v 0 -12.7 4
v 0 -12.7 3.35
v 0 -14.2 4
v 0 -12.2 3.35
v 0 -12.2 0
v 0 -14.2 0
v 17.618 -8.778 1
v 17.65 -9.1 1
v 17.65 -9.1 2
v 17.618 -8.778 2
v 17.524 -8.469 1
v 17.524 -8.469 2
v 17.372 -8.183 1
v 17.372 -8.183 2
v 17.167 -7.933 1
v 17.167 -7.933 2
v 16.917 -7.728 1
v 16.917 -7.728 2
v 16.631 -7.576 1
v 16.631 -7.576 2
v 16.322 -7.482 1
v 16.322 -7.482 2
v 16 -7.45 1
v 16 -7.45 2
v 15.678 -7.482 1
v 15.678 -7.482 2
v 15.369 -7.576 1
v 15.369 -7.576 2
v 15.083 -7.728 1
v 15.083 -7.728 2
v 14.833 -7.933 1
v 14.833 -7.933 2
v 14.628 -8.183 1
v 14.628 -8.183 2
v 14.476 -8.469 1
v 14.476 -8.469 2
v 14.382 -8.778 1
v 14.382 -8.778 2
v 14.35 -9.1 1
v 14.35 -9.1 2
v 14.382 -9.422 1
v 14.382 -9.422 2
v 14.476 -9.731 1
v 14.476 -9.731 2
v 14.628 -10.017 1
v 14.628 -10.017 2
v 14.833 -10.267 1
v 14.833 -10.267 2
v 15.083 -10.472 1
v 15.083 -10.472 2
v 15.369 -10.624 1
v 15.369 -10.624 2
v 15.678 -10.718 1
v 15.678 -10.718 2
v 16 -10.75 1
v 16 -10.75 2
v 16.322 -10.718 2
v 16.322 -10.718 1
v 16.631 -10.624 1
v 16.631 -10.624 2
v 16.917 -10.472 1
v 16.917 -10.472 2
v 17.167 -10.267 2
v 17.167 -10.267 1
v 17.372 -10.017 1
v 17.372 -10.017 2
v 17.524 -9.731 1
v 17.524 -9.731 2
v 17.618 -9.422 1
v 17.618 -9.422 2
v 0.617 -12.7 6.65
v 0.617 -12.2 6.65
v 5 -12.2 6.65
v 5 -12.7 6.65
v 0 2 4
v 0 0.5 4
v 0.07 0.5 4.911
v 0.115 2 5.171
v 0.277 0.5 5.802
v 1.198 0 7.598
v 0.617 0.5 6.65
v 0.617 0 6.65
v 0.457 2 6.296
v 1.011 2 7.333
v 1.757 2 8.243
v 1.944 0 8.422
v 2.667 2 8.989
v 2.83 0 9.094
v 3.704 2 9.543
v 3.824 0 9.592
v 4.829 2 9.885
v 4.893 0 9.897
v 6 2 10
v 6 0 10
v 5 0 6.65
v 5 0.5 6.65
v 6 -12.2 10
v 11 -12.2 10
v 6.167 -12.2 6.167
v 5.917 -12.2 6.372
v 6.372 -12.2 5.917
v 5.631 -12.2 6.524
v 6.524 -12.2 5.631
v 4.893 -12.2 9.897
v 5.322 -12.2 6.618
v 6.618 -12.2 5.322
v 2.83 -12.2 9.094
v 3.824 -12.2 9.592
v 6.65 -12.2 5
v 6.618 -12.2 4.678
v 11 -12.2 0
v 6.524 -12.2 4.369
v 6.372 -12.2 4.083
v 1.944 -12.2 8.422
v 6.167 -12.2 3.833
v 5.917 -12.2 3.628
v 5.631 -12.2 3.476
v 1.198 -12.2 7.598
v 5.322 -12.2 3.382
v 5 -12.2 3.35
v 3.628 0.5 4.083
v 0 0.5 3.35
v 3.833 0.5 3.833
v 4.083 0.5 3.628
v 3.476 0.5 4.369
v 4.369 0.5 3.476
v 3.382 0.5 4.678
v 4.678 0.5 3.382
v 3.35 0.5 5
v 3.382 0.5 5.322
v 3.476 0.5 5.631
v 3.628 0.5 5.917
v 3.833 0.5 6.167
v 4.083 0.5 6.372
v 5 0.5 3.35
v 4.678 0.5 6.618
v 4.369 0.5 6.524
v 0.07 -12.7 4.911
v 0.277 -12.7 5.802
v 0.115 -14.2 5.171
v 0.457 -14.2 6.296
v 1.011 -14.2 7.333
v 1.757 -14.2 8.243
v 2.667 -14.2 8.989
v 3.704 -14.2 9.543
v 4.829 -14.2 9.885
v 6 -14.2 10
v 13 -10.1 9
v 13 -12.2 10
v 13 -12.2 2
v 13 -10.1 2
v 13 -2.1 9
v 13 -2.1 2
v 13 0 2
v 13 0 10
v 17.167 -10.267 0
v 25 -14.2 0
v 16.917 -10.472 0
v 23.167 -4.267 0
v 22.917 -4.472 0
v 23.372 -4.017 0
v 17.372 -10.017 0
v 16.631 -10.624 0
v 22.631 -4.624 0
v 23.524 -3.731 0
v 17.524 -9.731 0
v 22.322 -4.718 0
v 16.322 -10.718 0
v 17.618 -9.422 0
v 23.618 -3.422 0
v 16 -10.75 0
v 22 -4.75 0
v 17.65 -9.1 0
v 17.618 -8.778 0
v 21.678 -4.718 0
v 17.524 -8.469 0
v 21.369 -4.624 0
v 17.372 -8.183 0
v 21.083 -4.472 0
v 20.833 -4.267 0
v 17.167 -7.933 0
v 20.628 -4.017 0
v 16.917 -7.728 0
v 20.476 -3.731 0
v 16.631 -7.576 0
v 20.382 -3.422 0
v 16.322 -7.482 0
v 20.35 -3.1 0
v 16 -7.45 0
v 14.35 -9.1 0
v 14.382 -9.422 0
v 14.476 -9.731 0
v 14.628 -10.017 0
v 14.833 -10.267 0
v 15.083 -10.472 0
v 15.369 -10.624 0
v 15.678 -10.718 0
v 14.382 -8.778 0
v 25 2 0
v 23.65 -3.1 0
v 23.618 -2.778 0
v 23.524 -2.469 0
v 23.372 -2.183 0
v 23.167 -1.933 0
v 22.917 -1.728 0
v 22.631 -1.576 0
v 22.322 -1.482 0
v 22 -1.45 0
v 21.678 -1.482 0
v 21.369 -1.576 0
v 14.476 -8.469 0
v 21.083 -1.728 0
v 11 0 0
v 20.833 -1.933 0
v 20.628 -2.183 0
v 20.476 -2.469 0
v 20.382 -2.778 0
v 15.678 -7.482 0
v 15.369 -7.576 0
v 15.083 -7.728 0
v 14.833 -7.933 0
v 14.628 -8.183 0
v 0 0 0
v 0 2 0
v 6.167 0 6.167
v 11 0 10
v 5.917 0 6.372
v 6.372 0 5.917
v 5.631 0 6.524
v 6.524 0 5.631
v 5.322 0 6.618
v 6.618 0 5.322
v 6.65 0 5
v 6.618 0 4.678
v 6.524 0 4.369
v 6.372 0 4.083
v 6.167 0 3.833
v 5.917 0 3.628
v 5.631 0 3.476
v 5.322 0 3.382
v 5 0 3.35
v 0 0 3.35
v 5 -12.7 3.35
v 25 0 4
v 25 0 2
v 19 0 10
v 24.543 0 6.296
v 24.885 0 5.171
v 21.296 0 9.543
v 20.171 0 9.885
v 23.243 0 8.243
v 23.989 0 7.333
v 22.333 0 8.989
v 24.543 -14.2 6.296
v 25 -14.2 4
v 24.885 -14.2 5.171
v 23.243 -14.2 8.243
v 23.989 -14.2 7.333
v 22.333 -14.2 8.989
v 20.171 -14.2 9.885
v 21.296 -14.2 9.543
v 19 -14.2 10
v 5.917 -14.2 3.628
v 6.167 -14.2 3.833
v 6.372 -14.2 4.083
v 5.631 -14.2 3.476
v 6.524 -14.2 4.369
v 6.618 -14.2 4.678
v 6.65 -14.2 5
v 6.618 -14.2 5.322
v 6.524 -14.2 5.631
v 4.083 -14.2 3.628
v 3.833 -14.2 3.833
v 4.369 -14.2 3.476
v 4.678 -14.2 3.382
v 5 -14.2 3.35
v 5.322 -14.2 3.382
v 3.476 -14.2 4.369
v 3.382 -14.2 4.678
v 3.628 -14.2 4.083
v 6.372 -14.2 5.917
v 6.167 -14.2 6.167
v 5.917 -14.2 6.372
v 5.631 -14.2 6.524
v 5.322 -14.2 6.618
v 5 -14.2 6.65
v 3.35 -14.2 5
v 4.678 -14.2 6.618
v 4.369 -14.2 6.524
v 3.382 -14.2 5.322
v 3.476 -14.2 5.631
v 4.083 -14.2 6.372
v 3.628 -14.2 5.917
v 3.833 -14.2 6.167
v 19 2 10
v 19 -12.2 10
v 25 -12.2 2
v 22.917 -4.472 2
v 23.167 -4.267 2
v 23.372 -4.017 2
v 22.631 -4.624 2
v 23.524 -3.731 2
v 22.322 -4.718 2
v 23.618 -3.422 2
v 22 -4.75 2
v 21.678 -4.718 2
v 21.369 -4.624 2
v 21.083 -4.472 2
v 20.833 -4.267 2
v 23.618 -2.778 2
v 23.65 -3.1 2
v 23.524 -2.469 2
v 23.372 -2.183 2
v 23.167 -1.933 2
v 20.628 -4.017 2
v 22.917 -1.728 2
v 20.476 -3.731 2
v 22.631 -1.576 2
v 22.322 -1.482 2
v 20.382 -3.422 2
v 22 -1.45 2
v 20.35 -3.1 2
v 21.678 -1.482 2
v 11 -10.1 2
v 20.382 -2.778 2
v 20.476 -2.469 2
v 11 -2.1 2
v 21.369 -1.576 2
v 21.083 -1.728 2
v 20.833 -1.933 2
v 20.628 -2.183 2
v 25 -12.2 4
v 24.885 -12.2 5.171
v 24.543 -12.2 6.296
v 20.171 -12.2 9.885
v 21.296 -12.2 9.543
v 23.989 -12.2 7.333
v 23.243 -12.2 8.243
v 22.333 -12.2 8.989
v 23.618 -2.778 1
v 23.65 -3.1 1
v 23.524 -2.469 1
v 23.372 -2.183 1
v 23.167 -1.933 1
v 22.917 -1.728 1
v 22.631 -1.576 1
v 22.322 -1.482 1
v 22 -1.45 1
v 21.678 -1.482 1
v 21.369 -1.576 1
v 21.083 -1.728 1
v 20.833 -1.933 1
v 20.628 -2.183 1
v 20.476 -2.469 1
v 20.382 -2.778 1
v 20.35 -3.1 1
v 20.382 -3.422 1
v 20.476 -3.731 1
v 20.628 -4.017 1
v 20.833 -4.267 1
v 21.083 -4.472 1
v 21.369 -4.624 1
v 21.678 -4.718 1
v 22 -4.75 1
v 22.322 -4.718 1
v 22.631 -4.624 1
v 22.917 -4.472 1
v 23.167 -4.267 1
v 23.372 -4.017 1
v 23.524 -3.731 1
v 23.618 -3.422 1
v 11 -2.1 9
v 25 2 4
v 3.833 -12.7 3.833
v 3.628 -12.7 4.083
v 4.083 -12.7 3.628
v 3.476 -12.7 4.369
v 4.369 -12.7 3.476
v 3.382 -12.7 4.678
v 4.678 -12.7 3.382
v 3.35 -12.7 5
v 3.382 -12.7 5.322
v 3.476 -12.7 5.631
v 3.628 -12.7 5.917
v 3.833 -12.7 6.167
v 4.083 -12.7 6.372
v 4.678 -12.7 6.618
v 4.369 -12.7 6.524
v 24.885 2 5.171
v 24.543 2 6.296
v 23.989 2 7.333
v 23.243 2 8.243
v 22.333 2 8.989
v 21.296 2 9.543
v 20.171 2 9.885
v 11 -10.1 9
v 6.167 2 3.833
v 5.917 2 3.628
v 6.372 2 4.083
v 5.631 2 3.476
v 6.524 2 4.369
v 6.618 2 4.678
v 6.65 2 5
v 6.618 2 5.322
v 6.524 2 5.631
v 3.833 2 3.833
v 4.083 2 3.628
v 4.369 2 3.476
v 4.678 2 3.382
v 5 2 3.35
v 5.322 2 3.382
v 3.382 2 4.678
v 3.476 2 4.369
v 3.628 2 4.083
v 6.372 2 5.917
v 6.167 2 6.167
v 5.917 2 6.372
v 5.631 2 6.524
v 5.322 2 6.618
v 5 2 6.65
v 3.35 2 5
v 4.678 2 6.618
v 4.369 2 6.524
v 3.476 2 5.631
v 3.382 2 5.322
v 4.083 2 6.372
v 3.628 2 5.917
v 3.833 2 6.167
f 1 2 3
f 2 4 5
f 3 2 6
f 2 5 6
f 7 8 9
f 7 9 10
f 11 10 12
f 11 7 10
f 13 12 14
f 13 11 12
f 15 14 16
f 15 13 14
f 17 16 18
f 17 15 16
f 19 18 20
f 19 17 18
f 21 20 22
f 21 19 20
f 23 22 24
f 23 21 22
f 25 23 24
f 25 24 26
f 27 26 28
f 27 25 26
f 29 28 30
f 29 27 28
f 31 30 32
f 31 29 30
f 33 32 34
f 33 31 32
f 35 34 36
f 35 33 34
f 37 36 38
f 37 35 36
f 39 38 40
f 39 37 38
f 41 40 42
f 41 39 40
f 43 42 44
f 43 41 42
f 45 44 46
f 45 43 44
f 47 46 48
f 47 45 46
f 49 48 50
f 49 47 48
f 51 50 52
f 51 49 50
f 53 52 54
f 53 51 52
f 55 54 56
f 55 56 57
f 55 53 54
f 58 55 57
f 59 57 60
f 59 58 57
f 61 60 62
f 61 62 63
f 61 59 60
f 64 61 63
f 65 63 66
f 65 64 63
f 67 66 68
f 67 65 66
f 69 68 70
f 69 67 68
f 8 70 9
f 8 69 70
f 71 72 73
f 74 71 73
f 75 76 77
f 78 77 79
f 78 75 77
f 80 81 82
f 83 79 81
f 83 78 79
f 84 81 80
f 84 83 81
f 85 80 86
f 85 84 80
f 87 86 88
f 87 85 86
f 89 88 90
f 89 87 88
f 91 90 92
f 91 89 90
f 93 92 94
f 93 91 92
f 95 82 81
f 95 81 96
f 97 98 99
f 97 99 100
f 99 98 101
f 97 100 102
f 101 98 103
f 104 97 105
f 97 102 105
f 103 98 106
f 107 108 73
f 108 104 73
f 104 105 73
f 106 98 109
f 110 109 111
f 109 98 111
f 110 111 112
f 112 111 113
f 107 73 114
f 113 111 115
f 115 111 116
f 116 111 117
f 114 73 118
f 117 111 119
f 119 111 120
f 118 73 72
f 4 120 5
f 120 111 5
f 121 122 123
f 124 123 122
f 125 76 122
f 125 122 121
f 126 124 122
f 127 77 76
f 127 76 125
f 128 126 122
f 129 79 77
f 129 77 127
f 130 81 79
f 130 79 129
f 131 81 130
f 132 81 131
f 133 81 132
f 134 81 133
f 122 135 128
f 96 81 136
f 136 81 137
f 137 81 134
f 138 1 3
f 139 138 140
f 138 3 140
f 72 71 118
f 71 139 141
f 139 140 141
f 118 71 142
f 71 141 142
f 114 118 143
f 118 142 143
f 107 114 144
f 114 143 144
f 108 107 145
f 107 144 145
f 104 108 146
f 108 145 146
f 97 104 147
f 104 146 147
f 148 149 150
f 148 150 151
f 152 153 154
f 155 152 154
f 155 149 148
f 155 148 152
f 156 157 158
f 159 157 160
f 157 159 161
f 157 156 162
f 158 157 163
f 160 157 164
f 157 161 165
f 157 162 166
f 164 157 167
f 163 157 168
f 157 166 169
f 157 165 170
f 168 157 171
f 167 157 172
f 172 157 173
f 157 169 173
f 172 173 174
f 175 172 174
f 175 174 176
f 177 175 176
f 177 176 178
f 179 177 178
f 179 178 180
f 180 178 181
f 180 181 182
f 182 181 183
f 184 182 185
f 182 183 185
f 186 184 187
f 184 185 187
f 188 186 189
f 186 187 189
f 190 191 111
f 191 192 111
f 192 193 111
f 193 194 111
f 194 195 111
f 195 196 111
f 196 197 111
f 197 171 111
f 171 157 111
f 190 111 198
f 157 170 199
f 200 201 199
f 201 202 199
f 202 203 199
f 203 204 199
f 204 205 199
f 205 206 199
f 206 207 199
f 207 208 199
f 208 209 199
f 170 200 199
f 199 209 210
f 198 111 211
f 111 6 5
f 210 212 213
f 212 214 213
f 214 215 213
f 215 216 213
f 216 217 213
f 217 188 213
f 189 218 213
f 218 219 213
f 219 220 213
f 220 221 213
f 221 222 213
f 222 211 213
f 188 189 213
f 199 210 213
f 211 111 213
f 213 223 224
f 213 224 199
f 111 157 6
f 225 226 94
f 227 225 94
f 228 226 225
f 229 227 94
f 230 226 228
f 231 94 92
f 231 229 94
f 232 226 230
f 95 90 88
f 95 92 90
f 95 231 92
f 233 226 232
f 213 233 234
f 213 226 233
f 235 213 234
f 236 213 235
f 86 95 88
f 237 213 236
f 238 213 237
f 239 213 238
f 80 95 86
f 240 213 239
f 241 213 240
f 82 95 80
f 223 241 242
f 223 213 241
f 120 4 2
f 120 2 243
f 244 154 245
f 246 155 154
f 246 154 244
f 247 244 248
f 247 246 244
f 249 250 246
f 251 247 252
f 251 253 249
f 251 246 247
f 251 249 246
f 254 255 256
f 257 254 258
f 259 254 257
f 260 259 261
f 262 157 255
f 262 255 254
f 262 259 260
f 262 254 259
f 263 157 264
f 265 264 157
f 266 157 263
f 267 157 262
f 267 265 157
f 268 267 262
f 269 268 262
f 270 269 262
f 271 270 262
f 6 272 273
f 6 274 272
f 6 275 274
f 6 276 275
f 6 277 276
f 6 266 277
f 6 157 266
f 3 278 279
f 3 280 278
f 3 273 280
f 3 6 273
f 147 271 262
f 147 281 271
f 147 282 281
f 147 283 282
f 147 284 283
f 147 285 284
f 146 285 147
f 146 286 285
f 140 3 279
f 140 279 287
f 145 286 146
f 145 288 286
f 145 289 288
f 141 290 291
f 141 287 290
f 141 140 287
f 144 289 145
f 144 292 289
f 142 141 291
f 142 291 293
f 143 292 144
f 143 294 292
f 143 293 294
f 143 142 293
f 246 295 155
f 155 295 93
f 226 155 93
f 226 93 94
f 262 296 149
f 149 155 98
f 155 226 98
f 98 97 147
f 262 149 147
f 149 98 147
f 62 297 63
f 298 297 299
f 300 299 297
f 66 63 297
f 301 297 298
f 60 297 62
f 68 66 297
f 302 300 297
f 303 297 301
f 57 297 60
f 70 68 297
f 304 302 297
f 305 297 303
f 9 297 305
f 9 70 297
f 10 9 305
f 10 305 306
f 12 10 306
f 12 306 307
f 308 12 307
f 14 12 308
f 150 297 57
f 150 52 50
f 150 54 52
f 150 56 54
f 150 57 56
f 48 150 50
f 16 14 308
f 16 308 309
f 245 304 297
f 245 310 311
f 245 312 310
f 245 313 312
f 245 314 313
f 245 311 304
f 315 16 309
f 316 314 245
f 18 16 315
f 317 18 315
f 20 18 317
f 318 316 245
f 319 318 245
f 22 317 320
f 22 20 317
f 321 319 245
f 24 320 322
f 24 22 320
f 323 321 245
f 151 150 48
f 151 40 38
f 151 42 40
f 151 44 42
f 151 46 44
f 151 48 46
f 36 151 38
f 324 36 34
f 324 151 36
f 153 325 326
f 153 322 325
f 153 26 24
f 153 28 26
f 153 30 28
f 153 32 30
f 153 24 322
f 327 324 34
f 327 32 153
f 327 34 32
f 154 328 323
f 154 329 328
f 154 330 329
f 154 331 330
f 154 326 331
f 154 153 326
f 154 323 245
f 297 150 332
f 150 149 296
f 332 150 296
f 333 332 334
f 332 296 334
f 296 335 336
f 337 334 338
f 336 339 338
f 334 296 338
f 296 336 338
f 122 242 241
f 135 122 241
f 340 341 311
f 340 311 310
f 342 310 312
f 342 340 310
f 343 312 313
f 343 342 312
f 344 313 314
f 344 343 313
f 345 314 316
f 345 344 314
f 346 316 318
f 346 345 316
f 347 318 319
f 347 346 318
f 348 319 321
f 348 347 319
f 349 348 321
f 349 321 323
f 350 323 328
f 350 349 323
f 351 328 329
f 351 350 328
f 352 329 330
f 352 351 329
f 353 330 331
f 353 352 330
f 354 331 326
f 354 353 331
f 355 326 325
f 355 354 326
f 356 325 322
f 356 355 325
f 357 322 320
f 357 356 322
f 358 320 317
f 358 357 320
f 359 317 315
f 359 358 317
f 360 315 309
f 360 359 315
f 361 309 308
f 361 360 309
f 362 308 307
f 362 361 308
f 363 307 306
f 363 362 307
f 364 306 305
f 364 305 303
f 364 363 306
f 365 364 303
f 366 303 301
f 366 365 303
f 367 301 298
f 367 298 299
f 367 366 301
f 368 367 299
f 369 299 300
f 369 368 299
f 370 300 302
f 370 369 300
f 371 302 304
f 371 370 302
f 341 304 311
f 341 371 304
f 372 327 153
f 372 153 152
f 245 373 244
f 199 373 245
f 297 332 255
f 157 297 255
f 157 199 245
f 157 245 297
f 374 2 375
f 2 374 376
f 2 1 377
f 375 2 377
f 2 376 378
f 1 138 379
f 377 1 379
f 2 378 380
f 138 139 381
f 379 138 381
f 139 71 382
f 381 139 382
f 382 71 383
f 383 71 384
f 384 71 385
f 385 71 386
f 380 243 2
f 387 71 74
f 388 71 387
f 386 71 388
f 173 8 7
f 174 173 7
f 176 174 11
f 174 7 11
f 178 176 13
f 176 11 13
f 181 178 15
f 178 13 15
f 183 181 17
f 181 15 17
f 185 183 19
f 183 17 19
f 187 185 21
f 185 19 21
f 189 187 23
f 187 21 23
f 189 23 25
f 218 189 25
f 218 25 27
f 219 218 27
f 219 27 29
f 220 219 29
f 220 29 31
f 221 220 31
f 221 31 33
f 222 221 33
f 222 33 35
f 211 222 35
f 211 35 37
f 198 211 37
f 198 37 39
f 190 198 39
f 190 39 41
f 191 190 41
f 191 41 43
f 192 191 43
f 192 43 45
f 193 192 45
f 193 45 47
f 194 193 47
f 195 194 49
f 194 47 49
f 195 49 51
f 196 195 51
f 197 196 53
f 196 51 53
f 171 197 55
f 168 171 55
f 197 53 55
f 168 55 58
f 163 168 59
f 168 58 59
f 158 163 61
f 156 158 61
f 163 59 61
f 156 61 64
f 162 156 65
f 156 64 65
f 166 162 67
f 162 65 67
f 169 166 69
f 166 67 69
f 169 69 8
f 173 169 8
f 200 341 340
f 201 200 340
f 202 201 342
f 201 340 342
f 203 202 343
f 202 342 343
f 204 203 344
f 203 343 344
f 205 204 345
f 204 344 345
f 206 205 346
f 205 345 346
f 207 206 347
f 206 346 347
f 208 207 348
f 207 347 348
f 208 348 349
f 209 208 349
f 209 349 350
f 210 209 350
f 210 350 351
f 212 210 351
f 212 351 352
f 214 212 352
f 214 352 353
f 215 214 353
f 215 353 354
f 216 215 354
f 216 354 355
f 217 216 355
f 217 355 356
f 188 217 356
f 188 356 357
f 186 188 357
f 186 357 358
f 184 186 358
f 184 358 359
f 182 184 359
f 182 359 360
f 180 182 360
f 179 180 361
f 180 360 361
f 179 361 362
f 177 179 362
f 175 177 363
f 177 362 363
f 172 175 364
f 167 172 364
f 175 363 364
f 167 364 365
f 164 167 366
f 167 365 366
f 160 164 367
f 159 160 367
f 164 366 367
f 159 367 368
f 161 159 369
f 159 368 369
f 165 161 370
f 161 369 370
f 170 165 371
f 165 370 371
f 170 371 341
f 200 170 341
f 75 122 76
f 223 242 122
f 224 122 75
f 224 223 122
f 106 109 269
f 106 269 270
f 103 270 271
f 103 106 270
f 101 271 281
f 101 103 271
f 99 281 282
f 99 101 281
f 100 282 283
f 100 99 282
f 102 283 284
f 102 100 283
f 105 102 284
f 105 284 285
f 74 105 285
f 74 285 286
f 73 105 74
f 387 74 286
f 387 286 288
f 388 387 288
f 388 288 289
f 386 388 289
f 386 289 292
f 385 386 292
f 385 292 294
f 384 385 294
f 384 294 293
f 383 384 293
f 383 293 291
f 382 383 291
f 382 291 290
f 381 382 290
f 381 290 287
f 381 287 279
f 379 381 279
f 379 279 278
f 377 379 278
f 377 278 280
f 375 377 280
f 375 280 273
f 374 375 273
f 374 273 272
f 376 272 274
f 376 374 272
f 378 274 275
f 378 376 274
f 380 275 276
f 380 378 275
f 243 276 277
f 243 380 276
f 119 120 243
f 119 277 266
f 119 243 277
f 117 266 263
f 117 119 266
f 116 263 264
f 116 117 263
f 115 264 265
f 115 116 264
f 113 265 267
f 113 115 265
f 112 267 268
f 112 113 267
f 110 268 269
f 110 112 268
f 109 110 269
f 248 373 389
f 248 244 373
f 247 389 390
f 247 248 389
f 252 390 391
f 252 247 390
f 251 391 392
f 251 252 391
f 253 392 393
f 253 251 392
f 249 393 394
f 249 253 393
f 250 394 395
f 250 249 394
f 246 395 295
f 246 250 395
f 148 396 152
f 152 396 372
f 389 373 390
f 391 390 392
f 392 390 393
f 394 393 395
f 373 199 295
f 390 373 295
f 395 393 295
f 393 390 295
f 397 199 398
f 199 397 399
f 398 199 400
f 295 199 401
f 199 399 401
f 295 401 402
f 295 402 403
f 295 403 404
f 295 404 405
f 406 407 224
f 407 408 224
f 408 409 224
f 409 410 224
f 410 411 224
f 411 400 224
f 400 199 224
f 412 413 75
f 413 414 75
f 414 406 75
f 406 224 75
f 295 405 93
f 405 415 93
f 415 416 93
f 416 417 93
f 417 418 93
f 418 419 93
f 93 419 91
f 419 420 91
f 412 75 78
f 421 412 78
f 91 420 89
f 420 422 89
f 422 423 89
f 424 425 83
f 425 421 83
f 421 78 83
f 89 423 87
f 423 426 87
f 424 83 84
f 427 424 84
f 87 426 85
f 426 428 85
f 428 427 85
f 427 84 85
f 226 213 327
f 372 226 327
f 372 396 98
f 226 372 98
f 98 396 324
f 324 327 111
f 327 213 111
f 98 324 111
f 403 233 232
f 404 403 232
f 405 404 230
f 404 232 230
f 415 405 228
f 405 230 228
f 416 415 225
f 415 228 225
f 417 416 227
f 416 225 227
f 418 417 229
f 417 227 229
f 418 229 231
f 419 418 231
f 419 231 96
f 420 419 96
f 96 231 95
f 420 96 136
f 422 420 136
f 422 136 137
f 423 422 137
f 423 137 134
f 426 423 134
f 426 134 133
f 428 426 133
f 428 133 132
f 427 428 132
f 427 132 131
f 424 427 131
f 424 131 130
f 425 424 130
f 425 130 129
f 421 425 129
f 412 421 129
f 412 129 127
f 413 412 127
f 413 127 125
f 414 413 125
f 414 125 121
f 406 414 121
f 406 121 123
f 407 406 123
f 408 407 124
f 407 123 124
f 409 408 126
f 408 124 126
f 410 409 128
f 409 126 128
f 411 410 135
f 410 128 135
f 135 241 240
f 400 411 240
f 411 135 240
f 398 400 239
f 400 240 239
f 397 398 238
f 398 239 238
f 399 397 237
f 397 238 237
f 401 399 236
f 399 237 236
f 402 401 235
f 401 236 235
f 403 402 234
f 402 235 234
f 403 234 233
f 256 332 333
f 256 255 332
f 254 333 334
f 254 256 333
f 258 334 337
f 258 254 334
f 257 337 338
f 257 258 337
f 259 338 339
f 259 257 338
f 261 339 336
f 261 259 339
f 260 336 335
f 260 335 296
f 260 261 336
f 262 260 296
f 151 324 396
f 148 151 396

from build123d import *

# Parameters (mm, degrees)
EXTRUDE_2_DEPTH     = 10
SKETCH_3_R          = 1.5
EXTRUDE_3_DEPTH     = 1.5
SKETCH_5_R          = 1.65
CUT_EXTRUDE_2_DEPTH = 27.084669827
FILLET_1_R          = 6
SKETCH_6_W          = 10
SKETCH_6_H          = 1
SKETCH_6_W_2        = 5
EXTRUDE_4_DEPTH     = 4
SKETCH_7_W          = 5.689599517
SKETCH_7_H          = 3.3
CUT_EXTRUDE_3_DEPTH = 0.5
SKETCH_8_W          = 14.19653451
SKETCH_8_H          = 16.2
CUT_EXTRUDE_4_DEPTH = 30.624989451
MOVE_FACE_1_BY      = 12
CUT_EXTRUDE_5_REACH = 32.441
SKETCH_9_W          = 16.770919553
SKETCH_9_H          = 12.2
SKETCH_10_R         = 1.65
CUT_EXTRUDE_6_DEPTH = 31.127064245
FILLET_2_R          = 6
MOVE_FACE_2_BY      = 1


with BuildPart() as part:
    # Эскиз2 → Бобышка-Вытянуть2 (new body)
    with BuildSketch(Plane.XY):
        Polygon((0, 0), (0, 2), (13, 2), (13, -0.1), (24, -0.1), (24, -2.1), (11, -2.1), (11, 0), align=None)
    extrude(amount=EXTRUDE_2_DEPTH)

    # Эскиз3 → Бобышка-Вытянуть3 (add)
    with BuildSketch(Plane(origin=(0, -0.1, 0), x_dir=(1, 0, 0), z_dir=(0, 1, 0))):
        with Locations(Location((18.1, -5, 0), (0, 0, 90))):
            Circle(SKETCH_3_R)
    extrude(amount=EXTRUDE_3_DEPTH)

    # Эскиз5 → Вырез-Вытянуть2 (cut, through all)
    with BuildSketch(Plane.XZ):
        with Locations((5, 5)):
            Circle(SKETCH_5_R)
    extrude(amount=-CUT_EXTRUDE_2_DEPTH, mode=Mode.SUBTRACT)

    # Скругление1
    fillet_1_edges = [part.edges().sort_by_distance(p)[0] for p in [
        (24, -1.1, 10),
        (0, 1, 10),
    ]]
    fillet(fillet_1_edges, radius=FILLET_1_R)

    # Эскиз6 → Бобышка-Вытянуть4 (add)
    with BuildSketch(Plane(origin=(0, -2.1, 0), x_dir=(-1, 0, 0), z_dir=(0, -1, 0))):
        with Locations((-16, -0.5)):
            Rectangle(SKETCH_6_W, SKETCH_6_H)
        with Locations((-13.5, -9.5)):
            Rectangle(SKETCH_6_W_2, SKETCH_6_H)
    extrude(amount=EXTRUDE_4_DEPTH)

    # Эскиз7 → Вырез-Вытянуть3 (cut)
    with BuildSketch(Plane.XZ):
        with Locations((2.155200242, 5)):
            Rectangle(SKETCH_7_W, SKETCH_7_H)
    extrude(amount=-CUT_EXTRUDE_3_DEPTH, mode=Mode.SUBTRACT)

    # Зеркальное отражение1: part across plane


with BuildPart() as part_1:
    add(part.part)
    add(part.part.mirror(Plane.ZX.offset(-6.1)))

    # Эскиз8 → Вырез-Вытянуть4 (cut, through all)
    with BuildSketch(Plane.XY.offset(10)):
        with Locations((20.098267255, -6.1)):
            Rectangle(SKETCH_8_W, SKETCH_8_H)
    extrude(amount=-CUT_EXTRUDE_4_DEPTH, mode=Mode.SUBTRACT)

    # Move Face 1: a face moved outward by 12.0
    extrude(part_1.faces().sort_by_distance((13, -10.15, 5))[0], amount=MOVE_FACE_1_BY, dir=(1, 0, 0))

    # Вырез-Вытянуть5: up to this face of the body (flat: up to its plane)
    cut_extrude_5_end = Plane(part_1.part.faces().sort_by_distance((18, -6.1, 1))[0])
    # Эскиз9 → Вырез-Вытянуть5 (cut, up to the picked face)
    with BuildSketch(Plane.XY.offset(10), mode=Mode.PRIVATE) as cut_extrude_5_sk1:
        with Locations((21.385459776, -6.1)):
            Rectangle(SKETCH_9_W, SKETCH_9_H)
    cut_extrude_5_tool1 = split(extrude(cut_extrude_5_sk1.sketch, amount=-CUT_EXTRUDE_5_REACH, mode=Mode.PRIVATE), bisect_by=cut_extrude_5_end, keep=Keep.BOTH, mode=Mode.PRIVATE)
    add(cut_extrude_5_tool1.solids().sort_by(Axis((21.38546, -6.1, 10), (0, 0, -1)))[0], mode=Mode.SUBTRACT)

    # Эскиз10 → Вырез-Вытянуть6 (cut, through all)
    with BuildSketch(Plane.XY.offset(1)):
        with Locations((16, -9.1)):
            Circle(SKETCH_10_R)
        with Locations((22, -3.1)):
            Circle(SKETCH_10_R)
    extrude(amount=-CUT_EXTRUDE_6_DEPTH, mode=Mode.SUBTRACT)

    # Скругление2
    fillet_2_edges = [part_1.edges().sort_by_distance(p)[0] for p in [
        (25, -13.2, 10),
        (25, 1, 10),
    ]]
    fillet(fillet_2_edges, radius=FILLET_2_R)

    # Move Face 2: a face moved outward by 1.0
    extrude(part_1.faces().sort_by_distance((18.229149322, -6.1, 1))[0], amount=MOVE_FACE_2_BY, dir=(0, 0, 1))


solid = part_1.part
